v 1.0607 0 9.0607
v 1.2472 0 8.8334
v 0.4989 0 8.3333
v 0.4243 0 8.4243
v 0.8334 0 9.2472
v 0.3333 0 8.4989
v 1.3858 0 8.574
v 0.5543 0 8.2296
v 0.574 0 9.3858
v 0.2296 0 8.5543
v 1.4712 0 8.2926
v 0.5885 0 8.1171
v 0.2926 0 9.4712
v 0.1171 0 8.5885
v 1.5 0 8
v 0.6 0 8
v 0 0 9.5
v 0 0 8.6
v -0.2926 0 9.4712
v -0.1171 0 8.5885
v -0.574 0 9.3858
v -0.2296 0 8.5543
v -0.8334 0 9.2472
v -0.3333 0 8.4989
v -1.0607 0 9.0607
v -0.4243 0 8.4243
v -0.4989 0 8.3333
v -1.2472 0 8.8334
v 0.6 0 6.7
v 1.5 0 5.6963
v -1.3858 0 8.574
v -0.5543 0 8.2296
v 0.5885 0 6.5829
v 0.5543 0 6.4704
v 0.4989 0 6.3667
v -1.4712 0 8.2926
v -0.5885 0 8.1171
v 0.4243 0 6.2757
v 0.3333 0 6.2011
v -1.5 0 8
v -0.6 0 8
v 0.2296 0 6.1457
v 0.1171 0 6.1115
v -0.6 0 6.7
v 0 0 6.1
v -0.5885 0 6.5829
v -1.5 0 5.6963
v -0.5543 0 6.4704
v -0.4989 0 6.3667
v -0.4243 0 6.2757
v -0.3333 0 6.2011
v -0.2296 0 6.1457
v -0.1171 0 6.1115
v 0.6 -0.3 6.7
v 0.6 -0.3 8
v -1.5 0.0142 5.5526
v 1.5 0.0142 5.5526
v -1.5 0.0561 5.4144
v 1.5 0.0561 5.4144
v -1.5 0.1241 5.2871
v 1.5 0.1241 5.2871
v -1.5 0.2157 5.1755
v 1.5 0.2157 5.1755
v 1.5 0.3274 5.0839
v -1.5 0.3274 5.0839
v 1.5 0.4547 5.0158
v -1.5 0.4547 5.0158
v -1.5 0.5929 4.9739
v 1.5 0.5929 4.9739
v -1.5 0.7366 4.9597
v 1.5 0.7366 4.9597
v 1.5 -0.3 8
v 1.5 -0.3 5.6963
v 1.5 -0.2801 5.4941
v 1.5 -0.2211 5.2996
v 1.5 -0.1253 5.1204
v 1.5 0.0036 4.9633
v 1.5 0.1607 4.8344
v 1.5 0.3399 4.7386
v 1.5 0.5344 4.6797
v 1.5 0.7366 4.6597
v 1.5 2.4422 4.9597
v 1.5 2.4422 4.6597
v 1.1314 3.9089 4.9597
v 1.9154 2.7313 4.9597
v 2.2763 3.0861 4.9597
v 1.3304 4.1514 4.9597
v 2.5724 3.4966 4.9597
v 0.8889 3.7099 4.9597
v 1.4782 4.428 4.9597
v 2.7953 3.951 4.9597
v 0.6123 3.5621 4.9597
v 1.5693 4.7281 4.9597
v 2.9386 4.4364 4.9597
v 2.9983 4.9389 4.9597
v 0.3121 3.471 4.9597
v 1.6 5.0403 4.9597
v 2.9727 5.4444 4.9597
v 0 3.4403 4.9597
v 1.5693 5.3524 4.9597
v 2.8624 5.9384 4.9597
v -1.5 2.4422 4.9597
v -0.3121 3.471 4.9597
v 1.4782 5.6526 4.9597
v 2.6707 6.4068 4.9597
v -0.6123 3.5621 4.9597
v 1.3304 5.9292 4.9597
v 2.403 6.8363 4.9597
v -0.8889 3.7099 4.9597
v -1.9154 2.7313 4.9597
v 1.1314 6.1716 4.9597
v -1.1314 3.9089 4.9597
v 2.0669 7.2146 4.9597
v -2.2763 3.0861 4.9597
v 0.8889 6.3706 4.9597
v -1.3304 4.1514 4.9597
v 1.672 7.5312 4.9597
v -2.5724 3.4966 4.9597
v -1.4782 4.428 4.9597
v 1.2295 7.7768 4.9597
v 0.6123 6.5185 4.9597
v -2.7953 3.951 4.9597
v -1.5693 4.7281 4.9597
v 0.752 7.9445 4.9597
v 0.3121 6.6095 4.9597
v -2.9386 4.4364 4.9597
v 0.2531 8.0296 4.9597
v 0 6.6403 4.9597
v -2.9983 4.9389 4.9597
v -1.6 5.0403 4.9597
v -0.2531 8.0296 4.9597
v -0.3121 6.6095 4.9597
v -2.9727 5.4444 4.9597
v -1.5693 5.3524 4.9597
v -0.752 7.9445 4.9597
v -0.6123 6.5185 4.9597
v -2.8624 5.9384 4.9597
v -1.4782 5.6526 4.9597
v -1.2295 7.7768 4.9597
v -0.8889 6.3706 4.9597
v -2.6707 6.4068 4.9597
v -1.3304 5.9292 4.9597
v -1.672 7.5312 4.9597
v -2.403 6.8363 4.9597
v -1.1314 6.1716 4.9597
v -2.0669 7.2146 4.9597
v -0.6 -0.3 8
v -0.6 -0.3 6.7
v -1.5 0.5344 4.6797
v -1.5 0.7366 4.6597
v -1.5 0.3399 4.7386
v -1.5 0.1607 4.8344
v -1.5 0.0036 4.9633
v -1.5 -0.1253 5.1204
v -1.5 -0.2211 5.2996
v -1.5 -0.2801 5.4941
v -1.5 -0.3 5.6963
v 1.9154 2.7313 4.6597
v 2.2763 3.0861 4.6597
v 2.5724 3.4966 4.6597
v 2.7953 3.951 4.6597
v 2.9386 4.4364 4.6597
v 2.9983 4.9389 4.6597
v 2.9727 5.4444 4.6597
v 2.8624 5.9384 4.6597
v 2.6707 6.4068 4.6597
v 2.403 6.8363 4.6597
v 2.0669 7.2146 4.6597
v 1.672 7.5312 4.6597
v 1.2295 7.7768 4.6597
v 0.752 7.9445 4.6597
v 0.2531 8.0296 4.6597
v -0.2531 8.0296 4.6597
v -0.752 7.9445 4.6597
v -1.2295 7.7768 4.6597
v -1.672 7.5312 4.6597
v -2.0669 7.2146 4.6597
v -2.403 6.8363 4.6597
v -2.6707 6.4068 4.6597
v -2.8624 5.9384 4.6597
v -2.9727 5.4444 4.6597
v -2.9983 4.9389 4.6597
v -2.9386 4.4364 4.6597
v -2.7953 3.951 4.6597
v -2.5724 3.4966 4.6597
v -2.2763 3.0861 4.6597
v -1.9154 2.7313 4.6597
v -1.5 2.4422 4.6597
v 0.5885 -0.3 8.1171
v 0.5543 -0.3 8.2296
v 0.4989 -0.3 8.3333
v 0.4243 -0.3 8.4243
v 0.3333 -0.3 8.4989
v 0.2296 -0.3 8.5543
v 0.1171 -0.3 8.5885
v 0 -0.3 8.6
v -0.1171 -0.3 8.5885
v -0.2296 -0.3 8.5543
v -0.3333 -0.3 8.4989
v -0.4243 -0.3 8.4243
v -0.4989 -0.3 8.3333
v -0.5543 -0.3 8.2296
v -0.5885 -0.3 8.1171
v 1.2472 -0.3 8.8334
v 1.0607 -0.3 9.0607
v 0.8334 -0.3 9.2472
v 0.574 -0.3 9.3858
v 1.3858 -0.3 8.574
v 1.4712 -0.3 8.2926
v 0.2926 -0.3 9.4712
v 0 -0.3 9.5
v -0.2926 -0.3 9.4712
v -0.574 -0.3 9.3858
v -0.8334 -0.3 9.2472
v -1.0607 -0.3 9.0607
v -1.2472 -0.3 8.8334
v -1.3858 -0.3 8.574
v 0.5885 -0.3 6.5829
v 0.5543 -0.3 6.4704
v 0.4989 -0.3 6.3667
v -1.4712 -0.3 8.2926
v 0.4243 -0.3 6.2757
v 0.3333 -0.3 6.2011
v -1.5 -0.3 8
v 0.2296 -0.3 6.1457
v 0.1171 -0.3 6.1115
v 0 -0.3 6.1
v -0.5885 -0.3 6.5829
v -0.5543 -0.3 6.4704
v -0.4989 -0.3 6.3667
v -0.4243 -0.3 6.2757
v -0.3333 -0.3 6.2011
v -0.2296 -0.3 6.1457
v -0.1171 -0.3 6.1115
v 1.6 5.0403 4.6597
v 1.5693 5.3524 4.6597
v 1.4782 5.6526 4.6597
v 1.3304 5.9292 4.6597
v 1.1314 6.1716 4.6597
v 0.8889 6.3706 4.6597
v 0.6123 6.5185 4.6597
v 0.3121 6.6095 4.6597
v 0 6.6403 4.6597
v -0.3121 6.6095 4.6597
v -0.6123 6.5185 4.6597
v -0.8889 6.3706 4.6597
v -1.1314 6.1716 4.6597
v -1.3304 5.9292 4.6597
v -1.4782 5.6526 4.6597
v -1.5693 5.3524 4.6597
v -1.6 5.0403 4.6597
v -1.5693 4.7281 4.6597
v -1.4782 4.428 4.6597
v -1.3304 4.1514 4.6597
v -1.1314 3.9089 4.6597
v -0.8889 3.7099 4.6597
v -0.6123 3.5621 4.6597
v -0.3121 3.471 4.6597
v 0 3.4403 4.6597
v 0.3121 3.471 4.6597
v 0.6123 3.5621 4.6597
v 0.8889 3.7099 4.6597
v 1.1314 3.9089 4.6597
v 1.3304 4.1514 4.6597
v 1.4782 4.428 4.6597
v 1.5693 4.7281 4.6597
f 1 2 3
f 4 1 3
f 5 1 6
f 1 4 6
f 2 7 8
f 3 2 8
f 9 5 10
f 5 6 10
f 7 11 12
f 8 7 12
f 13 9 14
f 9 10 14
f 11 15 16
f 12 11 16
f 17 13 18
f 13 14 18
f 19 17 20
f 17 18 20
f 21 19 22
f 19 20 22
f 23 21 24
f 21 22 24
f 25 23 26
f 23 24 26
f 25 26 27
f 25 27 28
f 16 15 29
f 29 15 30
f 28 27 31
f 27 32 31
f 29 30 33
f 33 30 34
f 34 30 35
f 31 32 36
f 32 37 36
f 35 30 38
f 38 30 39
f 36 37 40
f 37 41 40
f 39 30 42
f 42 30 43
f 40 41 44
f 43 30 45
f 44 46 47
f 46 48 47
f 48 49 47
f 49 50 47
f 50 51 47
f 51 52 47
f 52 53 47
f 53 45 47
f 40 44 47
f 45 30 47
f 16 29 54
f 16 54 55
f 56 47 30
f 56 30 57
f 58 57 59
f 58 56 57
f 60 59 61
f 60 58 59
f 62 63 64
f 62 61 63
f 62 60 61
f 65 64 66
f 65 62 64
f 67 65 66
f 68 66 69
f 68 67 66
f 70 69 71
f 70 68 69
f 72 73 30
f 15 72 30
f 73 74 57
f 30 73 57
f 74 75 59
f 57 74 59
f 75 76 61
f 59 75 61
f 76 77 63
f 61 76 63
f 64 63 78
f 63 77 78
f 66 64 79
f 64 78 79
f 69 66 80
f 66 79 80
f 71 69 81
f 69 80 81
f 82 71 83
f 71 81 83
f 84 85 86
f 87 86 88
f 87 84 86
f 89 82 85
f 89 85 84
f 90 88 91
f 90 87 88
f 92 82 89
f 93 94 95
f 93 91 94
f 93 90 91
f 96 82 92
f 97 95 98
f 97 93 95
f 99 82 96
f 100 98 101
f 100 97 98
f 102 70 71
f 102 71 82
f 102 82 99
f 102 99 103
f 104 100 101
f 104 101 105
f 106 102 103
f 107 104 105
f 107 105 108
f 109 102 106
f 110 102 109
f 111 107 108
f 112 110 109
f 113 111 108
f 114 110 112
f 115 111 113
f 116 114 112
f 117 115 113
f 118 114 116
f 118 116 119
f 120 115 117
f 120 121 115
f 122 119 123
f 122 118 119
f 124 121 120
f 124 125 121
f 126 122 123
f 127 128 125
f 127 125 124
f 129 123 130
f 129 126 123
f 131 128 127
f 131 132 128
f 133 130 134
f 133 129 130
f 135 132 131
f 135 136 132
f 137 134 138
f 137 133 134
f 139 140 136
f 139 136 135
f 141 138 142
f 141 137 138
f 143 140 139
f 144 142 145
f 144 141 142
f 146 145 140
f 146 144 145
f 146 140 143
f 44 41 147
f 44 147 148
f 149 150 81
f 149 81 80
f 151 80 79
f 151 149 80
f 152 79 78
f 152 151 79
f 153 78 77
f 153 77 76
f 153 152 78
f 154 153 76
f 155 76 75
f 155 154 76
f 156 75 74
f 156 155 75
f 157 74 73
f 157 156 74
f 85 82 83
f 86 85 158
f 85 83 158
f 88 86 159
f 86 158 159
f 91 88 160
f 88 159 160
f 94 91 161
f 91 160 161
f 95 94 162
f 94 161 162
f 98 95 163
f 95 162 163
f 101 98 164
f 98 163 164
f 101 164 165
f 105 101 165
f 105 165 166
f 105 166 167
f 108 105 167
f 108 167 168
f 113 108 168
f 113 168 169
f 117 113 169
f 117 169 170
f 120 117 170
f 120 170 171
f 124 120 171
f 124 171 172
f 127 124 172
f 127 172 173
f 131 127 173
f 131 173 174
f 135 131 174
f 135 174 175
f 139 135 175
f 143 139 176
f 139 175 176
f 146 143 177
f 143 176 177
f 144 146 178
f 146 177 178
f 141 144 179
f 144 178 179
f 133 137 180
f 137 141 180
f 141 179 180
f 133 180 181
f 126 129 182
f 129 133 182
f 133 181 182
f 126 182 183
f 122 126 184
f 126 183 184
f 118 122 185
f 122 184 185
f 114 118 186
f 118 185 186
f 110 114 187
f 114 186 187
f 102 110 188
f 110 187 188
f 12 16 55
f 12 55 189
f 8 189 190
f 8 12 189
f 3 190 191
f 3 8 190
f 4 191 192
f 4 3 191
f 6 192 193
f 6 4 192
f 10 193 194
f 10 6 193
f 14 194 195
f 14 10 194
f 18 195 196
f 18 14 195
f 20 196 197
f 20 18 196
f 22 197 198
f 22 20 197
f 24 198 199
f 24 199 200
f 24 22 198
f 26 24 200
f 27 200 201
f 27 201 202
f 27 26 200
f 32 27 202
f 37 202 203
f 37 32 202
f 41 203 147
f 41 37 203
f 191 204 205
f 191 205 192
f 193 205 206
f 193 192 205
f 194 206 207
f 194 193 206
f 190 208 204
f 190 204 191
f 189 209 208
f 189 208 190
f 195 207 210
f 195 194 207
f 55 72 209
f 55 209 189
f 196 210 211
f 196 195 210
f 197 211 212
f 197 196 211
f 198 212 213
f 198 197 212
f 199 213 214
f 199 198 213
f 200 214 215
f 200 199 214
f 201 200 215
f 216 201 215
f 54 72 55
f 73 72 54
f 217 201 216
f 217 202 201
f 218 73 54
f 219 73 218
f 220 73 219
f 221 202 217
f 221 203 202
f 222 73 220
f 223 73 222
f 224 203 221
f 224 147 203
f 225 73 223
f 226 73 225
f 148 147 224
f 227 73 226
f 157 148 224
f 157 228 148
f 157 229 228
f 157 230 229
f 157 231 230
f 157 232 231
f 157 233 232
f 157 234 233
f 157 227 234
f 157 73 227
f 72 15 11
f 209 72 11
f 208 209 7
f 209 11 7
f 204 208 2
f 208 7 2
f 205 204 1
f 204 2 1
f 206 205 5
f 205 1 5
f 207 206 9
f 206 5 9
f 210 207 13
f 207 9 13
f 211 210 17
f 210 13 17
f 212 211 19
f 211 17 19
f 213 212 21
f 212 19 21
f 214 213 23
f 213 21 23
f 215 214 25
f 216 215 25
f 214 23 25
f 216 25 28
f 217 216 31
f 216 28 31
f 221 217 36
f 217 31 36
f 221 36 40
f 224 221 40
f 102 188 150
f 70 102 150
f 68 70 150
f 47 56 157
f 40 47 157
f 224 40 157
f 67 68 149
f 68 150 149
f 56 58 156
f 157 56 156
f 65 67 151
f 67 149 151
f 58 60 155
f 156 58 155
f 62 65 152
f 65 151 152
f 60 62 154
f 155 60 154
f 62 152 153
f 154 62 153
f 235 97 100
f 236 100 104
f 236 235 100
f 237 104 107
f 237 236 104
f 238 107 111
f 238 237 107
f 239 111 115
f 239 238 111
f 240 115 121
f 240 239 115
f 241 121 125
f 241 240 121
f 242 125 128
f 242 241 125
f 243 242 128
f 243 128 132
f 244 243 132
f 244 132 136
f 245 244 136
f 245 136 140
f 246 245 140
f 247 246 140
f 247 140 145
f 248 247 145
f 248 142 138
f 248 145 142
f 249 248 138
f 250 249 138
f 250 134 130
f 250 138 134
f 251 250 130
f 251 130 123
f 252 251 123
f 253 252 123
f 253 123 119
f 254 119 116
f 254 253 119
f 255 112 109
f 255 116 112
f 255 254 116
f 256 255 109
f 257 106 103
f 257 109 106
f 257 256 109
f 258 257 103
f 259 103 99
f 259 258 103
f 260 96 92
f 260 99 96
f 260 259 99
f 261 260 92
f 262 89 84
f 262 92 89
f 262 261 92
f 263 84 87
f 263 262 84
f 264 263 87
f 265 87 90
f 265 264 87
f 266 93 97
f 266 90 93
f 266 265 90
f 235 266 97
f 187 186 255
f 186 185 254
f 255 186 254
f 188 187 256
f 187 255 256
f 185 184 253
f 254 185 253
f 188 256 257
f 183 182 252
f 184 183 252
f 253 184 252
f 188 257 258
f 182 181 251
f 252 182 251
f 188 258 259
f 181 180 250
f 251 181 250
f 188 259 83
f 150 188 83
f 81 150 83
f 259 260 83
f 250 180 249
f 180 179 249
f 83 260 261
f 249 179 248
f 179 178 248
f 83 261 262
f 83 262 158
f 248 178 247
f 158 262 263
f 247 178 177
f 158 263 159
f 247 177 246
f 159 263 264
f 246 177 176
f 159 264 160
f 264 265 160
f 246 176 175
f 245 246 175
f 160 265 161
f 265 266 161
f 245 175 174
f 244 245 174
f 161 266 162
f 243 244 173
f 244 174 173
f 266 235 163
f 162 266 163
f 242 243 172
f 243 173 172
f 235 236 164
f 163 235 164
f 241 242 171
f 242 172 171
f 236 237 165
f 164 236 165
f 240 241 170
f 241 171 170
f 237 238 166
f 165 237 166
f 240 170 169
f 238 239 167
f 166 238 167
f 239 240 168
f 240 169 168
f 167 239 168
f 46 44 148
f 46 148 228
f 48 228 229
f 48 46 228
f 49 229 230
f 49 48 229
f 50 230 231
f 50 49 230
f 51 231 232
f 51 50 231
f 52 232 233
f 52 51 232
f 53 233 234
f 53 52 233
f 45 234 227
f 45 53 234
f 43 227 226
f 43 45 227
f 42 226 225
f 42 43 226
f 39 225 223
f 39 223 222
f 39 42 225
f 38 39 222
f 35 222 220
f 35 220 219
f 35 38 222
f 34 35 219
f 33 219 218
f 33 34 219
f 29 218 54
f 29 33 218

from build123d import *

# Parameters (mm, degrees)
SKETCH_1_R             = 1.6
SM_BASE_FLANGE_1_DEPTH = 0.3
OTHER_START            = -4
OTHER_1_OUTLINE_W      = 3
OTHER_1_OUTLINE_H      = 0.3
OTHER_1_DEPTH          = 8.959734012
OTHER_START_2          = 4.659734012
OTHER_1_2_OUTLINE_R    = 1.6
OTHER_1_2_DEPTH        = 1.0366
OTHER_1_3_DEPTH        = 8


with BuildPart() as part:
    # 基体-法兰1: sheet metal written as solids
    # Sketch 1 → 基体-法兰1 (new body)
    with BuildSketch(Plane(origin=(0, 0, 0), x_dir=(1, 0, 0), z_dir=(0, 1, 0))):
        with BuildLine():
            Line((-1.5, -8), (-1.5, -2.598076211))
            ThreePointArc((-1.5, -2.598076211), (0, 3), (1.5, -2.598076211))
            Line((1.5, -2.598076211), (1.5, -8))
            ThreePointArc((1.5, -8), (0, -9.5), (-1.5, -8))
        make_face()
        with Locations(Location((0, 0, 0), (0, 0, 270))):
            Circle(SKETCH_1_R, mode=Mode.SUBTRACT)
        with BuildLine():
            Line((0.6, -6.7), (0.6, -8))
            ThreePointArc((0.6, -8), (0, -8.6), (-0.6, -8))
            Line((-0.6, -8), (-0.6, -6.7))
            ThreePointArc((-0.6, -6.7), (0, -6.1), (0.6, -6.7))
        make_face(mode=Mode.SUBTRACT)
    extrude(amount=-SM_BASE_FLANGE_1_DEPTH)

    # Other 1: read off the stored shape, not the designer's step
    # Other 1 outline → Other 1 (cut)
    with BuildSketch(Plane.XY.offset(OTHER_START)):
        with Locations((0, -0.15)):
            Rectangle(OTHER_1_OUTLINE_W, OTHER_1_OUTLINE_H)
    extrude(amount=OTHER_1_DEPTH, mode=Mode.SUBTRACT)

    # Other 1 2 outline → Other 1 2 (add)
    with BuildSketch(Plane.XY.offset(OTHER_START_2)):
        with BuildLine():
            ThreePointArc((1.5, 2.442189777), (0, 8.040265988), (-1.5, 2.442189777))
            Line((-1.5, 2.442189777), (-1.5, 0))
            Line((-1.5, 0), (1.5, 0))
            Line((1.5, 0), (1.5, 2.442189777))
        make_face()
        with Locations((0, 5.040265988)):
            Circle(OTHER_1_2_OUTLINE_R, mode=Mode.SUBTRACT)
    extrude(amount=OTHER_1_2_DEPTH)

    # Other 1 3 outline → Other 1 3 (cut)
    with BuildSketch(Plane.YZ.offset(OTHER_START)):
        with BuildLine():
            Line((0.7366, 4.959734012), (10, 4.959734012))
            Line((10, 4.959734012), (10, 5.696334012))
            Line((10, 5.696334012), (0, 5.696334012))
            ThreePointArc((0, 5.696334012), (0.215745145, 5.175479157), (0.7366, 4.959734012))
        make_face()
        with BuildLine():
            Line((10, -4), (10, 4.659734016))
            Line((10, 4.659734016), (0.7366, 4.659734012))
            ThreePointArc((0.7366, 4.659734012), (0.00361311, 4.963347123), (-0.3, 5.696334012))
            Line((-0.3, 5.696334012), (-0.3, 7))
            Line((-0.3, 7), (-2, 7))
            Line((-2, 7), (-2, -4))
            Line((-2, -4), (10, -4))
        make_face()
    extrude(amount=OTHER_1_3_DEPTH, mode=Mode.SUBTRACT)


solid = part.part
